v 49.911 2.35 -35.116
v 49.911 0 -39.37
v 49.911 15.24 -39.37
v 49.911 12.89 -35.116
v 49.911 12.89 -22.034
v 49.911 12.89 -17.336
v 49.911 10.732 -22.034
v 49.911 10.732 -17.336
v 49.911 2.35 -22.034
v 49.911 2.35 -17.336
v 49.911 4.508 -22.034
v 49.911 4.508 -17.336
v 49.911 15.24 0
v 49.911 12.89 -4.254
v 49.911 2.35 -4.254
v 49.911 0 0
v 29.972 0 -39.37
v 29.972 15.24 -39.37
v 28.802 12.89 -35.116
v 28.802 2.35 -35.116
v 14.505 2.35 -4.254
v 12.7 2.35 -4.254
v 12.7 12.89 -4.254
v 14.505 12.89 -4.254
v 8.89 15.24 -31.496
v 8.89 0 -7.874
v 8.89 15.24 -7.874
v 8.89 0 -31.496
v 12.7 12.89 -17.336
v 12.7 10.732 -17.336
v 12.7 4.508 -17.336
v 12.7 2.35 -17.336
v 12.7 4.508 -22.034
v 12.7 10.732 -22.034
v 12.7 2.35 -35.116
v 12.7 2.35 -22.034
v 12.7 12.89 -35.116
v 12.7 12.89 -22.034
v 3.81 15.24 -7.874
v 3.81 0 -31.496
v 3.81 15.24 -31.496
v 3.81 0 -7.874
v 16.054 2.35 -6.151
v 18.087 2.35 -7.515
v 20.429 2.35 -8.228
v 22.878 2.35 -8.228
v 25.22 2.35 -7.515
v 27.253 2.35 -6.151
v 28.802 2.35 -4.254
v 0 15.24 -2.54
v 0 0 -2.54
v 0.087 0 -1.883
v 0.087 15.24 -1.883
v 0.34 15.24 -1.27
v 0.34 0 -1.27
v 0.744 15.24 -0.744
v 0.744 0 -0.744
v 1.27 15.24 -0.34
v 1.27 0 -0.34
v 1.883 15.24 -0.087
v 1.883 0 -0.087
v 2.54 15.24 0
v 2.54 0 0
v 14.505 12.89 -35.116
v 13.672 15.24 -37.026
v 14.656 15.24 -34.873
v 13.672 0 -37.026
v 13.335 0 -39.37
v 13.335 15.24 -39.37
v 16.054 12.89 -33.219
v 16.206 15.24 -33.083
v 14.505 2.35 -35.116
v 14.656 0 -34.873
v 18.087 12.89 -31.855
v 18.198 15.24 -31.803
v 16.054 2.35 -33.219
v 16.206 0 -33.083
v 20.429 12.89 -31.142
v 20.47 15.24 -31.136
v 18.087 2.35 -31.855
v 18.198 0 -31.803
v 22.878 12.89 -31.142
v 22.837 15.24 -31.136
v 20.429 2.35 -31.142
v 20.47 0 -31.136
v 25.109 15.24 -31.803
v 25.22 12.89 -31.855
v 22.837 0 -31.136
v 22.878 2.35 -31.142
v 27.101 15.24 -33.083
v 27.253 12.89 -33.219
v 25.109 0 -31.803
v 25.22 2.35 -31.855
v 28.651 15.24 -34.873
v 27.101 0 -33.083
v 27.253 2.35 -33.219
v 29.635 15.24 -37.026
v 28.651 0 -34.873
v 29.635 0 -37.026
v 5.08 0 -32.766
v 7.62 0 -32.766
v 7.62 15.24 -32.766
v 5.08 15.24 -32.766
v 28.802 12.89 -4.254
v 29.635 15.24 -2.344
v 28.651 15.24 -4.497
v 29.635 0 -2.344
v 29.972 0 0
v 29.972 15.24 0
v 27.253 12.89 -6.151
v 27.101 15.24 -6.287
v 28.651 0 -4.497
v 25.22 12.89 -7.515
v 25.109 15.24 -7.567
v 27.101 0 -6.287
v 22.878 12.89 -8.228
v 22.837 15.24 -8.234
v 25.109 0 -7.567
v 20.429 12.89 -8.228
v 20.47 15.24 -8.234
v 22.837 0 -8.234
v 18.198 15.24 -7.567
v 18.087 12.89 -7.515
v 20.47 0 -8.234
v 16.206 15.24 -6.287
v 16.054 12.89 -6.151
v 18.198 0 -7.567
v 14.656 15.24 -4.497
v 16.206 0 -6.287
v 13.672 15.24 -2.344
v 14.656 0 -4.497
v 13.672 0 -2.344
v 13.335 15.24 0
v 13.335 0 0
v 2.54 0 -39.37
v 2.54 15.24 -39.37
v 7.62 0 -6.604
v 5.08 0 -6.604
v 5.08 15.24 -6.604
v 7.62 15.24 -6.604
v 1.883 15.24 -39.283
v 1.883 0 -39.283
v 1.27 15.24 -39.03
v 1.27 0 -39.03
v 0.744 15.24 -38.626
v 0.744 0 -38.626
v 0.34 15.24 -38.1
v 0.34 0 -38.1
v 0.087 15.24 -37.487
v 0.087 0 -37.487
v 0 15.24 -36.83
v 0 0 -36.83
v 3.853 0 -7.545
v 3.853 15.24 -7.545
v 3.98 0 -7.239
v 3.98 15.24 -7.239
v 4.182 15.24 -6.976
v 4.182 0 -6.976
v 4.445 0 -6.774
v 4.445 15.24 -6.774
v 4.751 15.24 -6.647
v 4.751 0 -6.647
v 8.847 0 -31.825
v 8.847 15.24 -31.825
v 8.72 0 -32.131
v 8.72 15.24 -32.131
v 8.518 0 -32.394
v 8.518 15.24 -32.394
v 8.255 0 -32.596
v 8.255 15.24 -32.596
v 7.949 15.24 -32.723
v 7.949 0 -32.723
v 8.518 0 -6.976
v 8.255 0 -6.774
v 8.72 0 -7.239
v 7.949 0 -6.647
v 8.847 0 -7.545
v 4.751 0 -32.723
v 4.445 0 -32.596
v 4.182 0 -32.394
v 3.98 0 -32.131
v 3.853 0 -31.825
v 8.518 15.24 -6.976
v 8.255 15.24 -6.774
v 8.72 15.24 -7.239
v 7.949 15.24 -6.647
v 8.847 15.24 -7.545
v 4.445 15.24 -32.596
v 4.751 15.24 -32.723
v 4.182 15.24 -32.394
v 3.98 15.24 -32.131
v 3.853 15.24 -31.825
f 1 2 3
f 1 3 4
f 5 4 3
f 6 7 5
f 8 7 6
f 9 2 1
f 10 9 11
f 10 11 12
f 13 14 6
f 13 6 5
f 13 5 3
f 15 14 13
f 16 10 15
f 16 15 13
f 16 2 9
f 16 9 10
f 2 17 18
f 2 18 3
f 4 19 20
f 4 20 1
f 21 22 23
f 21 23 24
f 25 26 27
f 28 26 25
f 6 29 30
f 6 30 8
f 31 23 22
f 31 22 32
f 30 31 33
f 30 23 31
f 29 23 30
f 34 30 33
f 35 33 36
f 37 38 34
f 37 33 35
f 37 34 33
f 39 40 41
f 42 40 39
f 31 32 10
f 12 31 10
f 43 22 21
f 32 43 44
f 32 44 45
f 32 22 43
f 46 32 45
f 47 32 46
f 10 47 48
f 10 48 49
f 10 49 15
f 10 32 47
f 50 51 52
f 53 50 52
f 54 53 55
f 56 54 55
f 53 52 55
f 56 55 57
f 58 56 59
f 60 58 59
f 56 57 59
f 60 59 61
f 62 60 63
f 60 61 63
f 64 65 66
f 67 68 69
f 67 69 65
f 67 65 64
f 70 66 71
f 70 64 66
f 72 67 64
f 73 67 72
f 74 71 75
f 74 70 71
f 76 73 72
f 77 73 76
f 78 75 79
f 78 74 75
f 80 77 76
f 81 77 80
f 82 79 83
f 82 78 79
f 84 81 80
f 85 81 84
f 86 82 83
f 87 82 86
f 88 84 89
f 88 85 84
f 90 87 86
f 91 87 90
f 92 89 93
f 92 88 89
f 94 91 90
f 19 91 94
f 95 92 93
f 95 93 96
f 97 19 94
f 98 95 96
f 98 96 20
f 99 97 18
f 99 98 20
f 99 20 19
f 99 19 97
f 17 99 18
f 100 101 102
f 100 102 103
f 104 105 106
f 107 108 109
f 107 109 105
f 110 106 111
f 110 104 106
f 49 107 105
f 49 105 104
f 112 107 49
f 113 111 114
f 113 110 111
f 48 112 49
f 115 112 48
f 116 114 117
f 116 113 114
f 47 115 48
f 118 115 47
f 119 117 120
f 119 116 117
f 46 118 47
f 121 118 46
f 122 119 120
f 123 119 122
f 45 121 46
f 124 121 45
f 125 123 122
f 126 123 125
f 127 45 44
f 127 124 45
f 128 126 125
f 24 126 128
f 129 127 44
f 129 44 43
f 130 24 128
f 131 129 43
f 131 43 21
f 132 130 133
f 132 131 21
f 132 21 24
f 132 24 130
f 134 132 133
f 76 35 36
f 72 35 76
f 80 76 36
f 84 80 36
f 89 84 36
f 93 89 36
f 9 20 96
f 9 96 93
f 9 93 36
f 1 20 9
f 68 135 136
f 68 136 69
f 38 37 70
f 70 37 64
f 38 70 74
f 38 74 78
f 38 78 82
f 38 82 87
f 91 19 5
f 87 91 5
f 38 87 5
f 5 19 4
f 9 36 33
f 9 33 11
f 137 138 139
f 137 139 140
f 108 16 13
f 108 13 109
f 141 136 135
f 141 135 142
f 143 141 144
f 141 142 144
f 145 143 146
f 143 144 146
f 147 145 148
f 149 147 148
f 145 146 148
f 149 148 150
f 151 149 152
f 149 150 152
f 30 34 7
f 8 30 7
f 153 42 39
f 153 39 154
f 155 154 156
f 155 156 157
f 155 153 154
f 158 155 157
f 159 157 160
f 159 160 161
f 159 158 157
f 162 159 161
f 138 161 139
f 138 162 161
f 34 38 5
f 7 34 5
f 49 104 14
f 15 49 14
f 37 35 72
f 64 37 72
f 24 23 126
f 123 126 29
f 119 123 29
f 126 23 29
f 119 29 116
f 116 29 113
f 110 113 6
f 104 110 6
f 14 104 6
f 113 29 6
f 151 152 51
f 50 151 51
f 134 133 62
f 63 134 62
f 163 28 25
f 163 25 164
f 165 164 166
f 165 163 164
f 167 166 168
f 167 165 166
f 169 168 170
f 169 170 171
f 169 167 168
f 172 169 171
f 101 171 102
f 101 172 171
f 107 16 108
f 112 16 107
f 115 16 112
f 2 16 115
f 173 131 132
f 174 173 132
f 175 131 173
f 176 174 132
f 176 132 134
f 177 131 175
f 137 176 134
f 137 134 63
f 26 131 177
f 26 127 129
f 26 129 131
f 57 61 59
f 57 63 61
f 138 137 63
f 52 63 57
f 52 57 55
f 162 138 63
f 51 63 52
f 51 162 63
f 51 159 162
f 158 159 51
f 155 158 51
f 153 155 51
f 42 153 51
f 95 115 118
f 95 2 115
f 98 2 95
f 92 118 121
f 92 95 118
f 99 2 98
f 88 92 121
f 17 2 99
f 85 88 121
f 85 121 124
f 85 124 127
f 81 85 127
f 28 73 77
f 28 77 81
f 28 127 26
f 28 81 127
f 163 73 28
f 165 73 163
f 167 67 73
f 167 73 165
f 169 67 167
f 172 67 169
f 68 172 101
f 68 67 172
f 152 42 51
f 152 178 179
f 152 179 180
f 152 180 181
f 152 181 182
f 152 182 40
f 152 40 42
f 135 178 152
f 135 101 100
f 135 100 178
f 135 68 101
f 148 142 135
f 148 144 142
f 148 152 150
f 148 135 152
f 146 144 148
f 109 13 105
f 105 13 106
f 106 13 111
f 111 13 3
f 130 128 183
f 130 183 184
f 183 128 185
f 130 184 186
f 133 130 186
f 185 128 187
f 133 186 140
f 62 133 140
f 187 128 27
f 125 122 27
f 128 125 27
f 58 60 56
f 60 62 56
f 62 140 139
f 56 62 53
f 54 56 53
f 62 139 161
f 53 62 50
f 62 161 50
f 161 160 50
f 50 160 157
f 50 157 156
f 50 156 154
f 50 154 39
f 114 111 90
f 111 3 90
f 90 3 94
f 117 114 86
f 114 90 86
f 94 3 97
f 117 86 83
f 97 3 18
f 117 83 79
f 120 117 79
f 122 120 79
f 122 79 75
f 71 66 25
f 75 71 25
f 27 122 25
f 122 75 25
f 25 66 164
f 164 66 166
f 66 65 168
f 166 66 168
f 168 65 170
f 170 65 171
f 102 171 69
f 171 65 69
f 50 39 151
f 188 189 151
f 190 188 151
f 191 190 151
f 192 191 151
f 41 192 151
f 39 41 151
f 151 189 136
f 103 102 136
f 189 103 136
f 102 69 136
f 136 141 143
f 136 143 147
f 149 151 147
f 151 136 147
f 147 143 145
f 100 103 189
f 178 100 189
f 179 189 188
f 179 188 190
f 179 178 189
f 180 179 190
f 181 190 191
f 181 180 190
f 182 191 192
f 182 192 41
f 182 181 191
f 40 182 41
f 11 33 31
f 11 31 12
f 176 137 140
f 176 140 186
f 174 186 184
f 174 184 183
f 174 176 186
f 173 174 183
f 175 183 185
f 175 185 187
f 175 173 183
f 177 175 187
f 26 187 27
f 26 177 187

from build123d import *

# Parameters (mm, degrees)
BOSS_EXTRUDE1_DEPTH = 15.24
BOSS_EXTRUDE2_DEPTH = 15.24
SKETCH6_W           = 37.211
SKETCH6_H           = 30.861
CUT_EXTRUDE1_DEPTH  = 5.2705
SKETCH7_W           = 37.211
SKETCH7_H           = 4.699
BOSS_EXTRUDE3_DEPTH = 2.159


with BuildPart() as part:
    # Sketch3 → Boss-Extrude1 (new body)
    with BuildSketch(Plane(origin=(0, 0, 0), x_dir=(1, 0, 0), z_dir=(0, 1, 0))):
        with BuildLine():
            Line((2.54, 0), (10.16, 0))
            Line((10.16, 0), (12.7, 0))
            Line((12.7, 0), (12.7, 2.54))
            Line((12.7, 2.54), (12.7, 36.83))
            Line((12.7, 36.83), (12.7, 39.37))
            Line((12.7, 39.37), (10.16, 39.37))
            Line((10.16, 39.37), (2.54, 39.37))
            ThreePointArc((2.54, 39.37), (0.743948776, 38.626051224), (0, 36.83))
            Line((0, 36.83), (0, 2.54))
            ThreePointArc((0, 2.54), (0.743948776, 0.743948776), (2.54, 0))
        make_face()
        with BuildLine():
            Line((5.08, 6.604), (7.62, 6.604))
            ThreePointArc((7.62, 6.604), (8.518025612, 6.975974388), (8.89, 7.874))
            Line((8.89, 7.874), (8.89, 31.496))
            ThreePointArc((8.89, 31.496), (8.518025612, 32.394025612), (7.62, 32.766))
            Line((7.62, 32.766), (5.08, 32.766))
            ThreePointArc((5.08, 32.766), (4.181974388, 32.394025612), (3.81, 31.496))
            Line((3.81, 31.496), (3.81, 7.874))
            ThreePointArc((3.81, 7.874), (4.181974388, 6.975974388), (5.08, 6.604))
        make_face(mode=Mode.SUBTRACT)
    extrude(amount=BOSS_EXTRUDE1_DEPTH)

    # Sketch4 → Boss-Extrude2 (add)
    with BuildSketch(Plane(origin=(0, 0, 0), x_dir=(1, 0, 0), z_dir=(0, 1, 0))):
        with BuildLine():
            Line((12.7, 39.37), (13.335, 39.37))
            ThreePointArc((13.335, 39.37), (21.6535, 31.0515), (29.972, 39.37))
            Line((29.972, 39.37), (49.911, 39.37))
            Line((49.911, 39.37), (49.911, 0))
            Line((49.911, 0), (29.972, 0))
            ThreePointArc((29.972, 0), (21.6535, 8.3185), (13.335, 0))
            Line((13.335, 0), (12.7, 0))
            Line((12.7, 0), (12.7, 39.37))
        make_face()
    extrude(amount=BOSS_EXTRUDE2_DEPTH)

    # Sketch6 → Cut-Extrude1 (cut, symmetric)
    with BuildSketch(Plane(origin=(0, 7.62, 0), x_dir=(1, 0, 0), z_dir=(0, 1, 0))):
        with Locations((31.3055, 19.685)):
            Rectangle(SKETCH6_W, SKETCH6_H)
    extrude(amount=CUT_EXTRUDE1_DEPTH, both=True, mode=Mode.SUBTRACT)

    # Sketch7 → Boss-Extrude3 (add)
    with BuildSketch(Plane(origin=(0, 2.3495, 0), x_dir=(1, 0, 0), z_dir=(0, 1, 0))):
        with Locations((31.3055, 19.685)):
            Rectangle(SKETCH7_W, SKETCH7_H)
    boss_extrude3 = extrude(amount=BOSS_EXTRUDE3_DEPTH)

    # Mirror1: Boss-Extrude3 across plane
    add(boss_extrude3.mirror(Plane.ZX.offset(7.62)))


solid = part.part
